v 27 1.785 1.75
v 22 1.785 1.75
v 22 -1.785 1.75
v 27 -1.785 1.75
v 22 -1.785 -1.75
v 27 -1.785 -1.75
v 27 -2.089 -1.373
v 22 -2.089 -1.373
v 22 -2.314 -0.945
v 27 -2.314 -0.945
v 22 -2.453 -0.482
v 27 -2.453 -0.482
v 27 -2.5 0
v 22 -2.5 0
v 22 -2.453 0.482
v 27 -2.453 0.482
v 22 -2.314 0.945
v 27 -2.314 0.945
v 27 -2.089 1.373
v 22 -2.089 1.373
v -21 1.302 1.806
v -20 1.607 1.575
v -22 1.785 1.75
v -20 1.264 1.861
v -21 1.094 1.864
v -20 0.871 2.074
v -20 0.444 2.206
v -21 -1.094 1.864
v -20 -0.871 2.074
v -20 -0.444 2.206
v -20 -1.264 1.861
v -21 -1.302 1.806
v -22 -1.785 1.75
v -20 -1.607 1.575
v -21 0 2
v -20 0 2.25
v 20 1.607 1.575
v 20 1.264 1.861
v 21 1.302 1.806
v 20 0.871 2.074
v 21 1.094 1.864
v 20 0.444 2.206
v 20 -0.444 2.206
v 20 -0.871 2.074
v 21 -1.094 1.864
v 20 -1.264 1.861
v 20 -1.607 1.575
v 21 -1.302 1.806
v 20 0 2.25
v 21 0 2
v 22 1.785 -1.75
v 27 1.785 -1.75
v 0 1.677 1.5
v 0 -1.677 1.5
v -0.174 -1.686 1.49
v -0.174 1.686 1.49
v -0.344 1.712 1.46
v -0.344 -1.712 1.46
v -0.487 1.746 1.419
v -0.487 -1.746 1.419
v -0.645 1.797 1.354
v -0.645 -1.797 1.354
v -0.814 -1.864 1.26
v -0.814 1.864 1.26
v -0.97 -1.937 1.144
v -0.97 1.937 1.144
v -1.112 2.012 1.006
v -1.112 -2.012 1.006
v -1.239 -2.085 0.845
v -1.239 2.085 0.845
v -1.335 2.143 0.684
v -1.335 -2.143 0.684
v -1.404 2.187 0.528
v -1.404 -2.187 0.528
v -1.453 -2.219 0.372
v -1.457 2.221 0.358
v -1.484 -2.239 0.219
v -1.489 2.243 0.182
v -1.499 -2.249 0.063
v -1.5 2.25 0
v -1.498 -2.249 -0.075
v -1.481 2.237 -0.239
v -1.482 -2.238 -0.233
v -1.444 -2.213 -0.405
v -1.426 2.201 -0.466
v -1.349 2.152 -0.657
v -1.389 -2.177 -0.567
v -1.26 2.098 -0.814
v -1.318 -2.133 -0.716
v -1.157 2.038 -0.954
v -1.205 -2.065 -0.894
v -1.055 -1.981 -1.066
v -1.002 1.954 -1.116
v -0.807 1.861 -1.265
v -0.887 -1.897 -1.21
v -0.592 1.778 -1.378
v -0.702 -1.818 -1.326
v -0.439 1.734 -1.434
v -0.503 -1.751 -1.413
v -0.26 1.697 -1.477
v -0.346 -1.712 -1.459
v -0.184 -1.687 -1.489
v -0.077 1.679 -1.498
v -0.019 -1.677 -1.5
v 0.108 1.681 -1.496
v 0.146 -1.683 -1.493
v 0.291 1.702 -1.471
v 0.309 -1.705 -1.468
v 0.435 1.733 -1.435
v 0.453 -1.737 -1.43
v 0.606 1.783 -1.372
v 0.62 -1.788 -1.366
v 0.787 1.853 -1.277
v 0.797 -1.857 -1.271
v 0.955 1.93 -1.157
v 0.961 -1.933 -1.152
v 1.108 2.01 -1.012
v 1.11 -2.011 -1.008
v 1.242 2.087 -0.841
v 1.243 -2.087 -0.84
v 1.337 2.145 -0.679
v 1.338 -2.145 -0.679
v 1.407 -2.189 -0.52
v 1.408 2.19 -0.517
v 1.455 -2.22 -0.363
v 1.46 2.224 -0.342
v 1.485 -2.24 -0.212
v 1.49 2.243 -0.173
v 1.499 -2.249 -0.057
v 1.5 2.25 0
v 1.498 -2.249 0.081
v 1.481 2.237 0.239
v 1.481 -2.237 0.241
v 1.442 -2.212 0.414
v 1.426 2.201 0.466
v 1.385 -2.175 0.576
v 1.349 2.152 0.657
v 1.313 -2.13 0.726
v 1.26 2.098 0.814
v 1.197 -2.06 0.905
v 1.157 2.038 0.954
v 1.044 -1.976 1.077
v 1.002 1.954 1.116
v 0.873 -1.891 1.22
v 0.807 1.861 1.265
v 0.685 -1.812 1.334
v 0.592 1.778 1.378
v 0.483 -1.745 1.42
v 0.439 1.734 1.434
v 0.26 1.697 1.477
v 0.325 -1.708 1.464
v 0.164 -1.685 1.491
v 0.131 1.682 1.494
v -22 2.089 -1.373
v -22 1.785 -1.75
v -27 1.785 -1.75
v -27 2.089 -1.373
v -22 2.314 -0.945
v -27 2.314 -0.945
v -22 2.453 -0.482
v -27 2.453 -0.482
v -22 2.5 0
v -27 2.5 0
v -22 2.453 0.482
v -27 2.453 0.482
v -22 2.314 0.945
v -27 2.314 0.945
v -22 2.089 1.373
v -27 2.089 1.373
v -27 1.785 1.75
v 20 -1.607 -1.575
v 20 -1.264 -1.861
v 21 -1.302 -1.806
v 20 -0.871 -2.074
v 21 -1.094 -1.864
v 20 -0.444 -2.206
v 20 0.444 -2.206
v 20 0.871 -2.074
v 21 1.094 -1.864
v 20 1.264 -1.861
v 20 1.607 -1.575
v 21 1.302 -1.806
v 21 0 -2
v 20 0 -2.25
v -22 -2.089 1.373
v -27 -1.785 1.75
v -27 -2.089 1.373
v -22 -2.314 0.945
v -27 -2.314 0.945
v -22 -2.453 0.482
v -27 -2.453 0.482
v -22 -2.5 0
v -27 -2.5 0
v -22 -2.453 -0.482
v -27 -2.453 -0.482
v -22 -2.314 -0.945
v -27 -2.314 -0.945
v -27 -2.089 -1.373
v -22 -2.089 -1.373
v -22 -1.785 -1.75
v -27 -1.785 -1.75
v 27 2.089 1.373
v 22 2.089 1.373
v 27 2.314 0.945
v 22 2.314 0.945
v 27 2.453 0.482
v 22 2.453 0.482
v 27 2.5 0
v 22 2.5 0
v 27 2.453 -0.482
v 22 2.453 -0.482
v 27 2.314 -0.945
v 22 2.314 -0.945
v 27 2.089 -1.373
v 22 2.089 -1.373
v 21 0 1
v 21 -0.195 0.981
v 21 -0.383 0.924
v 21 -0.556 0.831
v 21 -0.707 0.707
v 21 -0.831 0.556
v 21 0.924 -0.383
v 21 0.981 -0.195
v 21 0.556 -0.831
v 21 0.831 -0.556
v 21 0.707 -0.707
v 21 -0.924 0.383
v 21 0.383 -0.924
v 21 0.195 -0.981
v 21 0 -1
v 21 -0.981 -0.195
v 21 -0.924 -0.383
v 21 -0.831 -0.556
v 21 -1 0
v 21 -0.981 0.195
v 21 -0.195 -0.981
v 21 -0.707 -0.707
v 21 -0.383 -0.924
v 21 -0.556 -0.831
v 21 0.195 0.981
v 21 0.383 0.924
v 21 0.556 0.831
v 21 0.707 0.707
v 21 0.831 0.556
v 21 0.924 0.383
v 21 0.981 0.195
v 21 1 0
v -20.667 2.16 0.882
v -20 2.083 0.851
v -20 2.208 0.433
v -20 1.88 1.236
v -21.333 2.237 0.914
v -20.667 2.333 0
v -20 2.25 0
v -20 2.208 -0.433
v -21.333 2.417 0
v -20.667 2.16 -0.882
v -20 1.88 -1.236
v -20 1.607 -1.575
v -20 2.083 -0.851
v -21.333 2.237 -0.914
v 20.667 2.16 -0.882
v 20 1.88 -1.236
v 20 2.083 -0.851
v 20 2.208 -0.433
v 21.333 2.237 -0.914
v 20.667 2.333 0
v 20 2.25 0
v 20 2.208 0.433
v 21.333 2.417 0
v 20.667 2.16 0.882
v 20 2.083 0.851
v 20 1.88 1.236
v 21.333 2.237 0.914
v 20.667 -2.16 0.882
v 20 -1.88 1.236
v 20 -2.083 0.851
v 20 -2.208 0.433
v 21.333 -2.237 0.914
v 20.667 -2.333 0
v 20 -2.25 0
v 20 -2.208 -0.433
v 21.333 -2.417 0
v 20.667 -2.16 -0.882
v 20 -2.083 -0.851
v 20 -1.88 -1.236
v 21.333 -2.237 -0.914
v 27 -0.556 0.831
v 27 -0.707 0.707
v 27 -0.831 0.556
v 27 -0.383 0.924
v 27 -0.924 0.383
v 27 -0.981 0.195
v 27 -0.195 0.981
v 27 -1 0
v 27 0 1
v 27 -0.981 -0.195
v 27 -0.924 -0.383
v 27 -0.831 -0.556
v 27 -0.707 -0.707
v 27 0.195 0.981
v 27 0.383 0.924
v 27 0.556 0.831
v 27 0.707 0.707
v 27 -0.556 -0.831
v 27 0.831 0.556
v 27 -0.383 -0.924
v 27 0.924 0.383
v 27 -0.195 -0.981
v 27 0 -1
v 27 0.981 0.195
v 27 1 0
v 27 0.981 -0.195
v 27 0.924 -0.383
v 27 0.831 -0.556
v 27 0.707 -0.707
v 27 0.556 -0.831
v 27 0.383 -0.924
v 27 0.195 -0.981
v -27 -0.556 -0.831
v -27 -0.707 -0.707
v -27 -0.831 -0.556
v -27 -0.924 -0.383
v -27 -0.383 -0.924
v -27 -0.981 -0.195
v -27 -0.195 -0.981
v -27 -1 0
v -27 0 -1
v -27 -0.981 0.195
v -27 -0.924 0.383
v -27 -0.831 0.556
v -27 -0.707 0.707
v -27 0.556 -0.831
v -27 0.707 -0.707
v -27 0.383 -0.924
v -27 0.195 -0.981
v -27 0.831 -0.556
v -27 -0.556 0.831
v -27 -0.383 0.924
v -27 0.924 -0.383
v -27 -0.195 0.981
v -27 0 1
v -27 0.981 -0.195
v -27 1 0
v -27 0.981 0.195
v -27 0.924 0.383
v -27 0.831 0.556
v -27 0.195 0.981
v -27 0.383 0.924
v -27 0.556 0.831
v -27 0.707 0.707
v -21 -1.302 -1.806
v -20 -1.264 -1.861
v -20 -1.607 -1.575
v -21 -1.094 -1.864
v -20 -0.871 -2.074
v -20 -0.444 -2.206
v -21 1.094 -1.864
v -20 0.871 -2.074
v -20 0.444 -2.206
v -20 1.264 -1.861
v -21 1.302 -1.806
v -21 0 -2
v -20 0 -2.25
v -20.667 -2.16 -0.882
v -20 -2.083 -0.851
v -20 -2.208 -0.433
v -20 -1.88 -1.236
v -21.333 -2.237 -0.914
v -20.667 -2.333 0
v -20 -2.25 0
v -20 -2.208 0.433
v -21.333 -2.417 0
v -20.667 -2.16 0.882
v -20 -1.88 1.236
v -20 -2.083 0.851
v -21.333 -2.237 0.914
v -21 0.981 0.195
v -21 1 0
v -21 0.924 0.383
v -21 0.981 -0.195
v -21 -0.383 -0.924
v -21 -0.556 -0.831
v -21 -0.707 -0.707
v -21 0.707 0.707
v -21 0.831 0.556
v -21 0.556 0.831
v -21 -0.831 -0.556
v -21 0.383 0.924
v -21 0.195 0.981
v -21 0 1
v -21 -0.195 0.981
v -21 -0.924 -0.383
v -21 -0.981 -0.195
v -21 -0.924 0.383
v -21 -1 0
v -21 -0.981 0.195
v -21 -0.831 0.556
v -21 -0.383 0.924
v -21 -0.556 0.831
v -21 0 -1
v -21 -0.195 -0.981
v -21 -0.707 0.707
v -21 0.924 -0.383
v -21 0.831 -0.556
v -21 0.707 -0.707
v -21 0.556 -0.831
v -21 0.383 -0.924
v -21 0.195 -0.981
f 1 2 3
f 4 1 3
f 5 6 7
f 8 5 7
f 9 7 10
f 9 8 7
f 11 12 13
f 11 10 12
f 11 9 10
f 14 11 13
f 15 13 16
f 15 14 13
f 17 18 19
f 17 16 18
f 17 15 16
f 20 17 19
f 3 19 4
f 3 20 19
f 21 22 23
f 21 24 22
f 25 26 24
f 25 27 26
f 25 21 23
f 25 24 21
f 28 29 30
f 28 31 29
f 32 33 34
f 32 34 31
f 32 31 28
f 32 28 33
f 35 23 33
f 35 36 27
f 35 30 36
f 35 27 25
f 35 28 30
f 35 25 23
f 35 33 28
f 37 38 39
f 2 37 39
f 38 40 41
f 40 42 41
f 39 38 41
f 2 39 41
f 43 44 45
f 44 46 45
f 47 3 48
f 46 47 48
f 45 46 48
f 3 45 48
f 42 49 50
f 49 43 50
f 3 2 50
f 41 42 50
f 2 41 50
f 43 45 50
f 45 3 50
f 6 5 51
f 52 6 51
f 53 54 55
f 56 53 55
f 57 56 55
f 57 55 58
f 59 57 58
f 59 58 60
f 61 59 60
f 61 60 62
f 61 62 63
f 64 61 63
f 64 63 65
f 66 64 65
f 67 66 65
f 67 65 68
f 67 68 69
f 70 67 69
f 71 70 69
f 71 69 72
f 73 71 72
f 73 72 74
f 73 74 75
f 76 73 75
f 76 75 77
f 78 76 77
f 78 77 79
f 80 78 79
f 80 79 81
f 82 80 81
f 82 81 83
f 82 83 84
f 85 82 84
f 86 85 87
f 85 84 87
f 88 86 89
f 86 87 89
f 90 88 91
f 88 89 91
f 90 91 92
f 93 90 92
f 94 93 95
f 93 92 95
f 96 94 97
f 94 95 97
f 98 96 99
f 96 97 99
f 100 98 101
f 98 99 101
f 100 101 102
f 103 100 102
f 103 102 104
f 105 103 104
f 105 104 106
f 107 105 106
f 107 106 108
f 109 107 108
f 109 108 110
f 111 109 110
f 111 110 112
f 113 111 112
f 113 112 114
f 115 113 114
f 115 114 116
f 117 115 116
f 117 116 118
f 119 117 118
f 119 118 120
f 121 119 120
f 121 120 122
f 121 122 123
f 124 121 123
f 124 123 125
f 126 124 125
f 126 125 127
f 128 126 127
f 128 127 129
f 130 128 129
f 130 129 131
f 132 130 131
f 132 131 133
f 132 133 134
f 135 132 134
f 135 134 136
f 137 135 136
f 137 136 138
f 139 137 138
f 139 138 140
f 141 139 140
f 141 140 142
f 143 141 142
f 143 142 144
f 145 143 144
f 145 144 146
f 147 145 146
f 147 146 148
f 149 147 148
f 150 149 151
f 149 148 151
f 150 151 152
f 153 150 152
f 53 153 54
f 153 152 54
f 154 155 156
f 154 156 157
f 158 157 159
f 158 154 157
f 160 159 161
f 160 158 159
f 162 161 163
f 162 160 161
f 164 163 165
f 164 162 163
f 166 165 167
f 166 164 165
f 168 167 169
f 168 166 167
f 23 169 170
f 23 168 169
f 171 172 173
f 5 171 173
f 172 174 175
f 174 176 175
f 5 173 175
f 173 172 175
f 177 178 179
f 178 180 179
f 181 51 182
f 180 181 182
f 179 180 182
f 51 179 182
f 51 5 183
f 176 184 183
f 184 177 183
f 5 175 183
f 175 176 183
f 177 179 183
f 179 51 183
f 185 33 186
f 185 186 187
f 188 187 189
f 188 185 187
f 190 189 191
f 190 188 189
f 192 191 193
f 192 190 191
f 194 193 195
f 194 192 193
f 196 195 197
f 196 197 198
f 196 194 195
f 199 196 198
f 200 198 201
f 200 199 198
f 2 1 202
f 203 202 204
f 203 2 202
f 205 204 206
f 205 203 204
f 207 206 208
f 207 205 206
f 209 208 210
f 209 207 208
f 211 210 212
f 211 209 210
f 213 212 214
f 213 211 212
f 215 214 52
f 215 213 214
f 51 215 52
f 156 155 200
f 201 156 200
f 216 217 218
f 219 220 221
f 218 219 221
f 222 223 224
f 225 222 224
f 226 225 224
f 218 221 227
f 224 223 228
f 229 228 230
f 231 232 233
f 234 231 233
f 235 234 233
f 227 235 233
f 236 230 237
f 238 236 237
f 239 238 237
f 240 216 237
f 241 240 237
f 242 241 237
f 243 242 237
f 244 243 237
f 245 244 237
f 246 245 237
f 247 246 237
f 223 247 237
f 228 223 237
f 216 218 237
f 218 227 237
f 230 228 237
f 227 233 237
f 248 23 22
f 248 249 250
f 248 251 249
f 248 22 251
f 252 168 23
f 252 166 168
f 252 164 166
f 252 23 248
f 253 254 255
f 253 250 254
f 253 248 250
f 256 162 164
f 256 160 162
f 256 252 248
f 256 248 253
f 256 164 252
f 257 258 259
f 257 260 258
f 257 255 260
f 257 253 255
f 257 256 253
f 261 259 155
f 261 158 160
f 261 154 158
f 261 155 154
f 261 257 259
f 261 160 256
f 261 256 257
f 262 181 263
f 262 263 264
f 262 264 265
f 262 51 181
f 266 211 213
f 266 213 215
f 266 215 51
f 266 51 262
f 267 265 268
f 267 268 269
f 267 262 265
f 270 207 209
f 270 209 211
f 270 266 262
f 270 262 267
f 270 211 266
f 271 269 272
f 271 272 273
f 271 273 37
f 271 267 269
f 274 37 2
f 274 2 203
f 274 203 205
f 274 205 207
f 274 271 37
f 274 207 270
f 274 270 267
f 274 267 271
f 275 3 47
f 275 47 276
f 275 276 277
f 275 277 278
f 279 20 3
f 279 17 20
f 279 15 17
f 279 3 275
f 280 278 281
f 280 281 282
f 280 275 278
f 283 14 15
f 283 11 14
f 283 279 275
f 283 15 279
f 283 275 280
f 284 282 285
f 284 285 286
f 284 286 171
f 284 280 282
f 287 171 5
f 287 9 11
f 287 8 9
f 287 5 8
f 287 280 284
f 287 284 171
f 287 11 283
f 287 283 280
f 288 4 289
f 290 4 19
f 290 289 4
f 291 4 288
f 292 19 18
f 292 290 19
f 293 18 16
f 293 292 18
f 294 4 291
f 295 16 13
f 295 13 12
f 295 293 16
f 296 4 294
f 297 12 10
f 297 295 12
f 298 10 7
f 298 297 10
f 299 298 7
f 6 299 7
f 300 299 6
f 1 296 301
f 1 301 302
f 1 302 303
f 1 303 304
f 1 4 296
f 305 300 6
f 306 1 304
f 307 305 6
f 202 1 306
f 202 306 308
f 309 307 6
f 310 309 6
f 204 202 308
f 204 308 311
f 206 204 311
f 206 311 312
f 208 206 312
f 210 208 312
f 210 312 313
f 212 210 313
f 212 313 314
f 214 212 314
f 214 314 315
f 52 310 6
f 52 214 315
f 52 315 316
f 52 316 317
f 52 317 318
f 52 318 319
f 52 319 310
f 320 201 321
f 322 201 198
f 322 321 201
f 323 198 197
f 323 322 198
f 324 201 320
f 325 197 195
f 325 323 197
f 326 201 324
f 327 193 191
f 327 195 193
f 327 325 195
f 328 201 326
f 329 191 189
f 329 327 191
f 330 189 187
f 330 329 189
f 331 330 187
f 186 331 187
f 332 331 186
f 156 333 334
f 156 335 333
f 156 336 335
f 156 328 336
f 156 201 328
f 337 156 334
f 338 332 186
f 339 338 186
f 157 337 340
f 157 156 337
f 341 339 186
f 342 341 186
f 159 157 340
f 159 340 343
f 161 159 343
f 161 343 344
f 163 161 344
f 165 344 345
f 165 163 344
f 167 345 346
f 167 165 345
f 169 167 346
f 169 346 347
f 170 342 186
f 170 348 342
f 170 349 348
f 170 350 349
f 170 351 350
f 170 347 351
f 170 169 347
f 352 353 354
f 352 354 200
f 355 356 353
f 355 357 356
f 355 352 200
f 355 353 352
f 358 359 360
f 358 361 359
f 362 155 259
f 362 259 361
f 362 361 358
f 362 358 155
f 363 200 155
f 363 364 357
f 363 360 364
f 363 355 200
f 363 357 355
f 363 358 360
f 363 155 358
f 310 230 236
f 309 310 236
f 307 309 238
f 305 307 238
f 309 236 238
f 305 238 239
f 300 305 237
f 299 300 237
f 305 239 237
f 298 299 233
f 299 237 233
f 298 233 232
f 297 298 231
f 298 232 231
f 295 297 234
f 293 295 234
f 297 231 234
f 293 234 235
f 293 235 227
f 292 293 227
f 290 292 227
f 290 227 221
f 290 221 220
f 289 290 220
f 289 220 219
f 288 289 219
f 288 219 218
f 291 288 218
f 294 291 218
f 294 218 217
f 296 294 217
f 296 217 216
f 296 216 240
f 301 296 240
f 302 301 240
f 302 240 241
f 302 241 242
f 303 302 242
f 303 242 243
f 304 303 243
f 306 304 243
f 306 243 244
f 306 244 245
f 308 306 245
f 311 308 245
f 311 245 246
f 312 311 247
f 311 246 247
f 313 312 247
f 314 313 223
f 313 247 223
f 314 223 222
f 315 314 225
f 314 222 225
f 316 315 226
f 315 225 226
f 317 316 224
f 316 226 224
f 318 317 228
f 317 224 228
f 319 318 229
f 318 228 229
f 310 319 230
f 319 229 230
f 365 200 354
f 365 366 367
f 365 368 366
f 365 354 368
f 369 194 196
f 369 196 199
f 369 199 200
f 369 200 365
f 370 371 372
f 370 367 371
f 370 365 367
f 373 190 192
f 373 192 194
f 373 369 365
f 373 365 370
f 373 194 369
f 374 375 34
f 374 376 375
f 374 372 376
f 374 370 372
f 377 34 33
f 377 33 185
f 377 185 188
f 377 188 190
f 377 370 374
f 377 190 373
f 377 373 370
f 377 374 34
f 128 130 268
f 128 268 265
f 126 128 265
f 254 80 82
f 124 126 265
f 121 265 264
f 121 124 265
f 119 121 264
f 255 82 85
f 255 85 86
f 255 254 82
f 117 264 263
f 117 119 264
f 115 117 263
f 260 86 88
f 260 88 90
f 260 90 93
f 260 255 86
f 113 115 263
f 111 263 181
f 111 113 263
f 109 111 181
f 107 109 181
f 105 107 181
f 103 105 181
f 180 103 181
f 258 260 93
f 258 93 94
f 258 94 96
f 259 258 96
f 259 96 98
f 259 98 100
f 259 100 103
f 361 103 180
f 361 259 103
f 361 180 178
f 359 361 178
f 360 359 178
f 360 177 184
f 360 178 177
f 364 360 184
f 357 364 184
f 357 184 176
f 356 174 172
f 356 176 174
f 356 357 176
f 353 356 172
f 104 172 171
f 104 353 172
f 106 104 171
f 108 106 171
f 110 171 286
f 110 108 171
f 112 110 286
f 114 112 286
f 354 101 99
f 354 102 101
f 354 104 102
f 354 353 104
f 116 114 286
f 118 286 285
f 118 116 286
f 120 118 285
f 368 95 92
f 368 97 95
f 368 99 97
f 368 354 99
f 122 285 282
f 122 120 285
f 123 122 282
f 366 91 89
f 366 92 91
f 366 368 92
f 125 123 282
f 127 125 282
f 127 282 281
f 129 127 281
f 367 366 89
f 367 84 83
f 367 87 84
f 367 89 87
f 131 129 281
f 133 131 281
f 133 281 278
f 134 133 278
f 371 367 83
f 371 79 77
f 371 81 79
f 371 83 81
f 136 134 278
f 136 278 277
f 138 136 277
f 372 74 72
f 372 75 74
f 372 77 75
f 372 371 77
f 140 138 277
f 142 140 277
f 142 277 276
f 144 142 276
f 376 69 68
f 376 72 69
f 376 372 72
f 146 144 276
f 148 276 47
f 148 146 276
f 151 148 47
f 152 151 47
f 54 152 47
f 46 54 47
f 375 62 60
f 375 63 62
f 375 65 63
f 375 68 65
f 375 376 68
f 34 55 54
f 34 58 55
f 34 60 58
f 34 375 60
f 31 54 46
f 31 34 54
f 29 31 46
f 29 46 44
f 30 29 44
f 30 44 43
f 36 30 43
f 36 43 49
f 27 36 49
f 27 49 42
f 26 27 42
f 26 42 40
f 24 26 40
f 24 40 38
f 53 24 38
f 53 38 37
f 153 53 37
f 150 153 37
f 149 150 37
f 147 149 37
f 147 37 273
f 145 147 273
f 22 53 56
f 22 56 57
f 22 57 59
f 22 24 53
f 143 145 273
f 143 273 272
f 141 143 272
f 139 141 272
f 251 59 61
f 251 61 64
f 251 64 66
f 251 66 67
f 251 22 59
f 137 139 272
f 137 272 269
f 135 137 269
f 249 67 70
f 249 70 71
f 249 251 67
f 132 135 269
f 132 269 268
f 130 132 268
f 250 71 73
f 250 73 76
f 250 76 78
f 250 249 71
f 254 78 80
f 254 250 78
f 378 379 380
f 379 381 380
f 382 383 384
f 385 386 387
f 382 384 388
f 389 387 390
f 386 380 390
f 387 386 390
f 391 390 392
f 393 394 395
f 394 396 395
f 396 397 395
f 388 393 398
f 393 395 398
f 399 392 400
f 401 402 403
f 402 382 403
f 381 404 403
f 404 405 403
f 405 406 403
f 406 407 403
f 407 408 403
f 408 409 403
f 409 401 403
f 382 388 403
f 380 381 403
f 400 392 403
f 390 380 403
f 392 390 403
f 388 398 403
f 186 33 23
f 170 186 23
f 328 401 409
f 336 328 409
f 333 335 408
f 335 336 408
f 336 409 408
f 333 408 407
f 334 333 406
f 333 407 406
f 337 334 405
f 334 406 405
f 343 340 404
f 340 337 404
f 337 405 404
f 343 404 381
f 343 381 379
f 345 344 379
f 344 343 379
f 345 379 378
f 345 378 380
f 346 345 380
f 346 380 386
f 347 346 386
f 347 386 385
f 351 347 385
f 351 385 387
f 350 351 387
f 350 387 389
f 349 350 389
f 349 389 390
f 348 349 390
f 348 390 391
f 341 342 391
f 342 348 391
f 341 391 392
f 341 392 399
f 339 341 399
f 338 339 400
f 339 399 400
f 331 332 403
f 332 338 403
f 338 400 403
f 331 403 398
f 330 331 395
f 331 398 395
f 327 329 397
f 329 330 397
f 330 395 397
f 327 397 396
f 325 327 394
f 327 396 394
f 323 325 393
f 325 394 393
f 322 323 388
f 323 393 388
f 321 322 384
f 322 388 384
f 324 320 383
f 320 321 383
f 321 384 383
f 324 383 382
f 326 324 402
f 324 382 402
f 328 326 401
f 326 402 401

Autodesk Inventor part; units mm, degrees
ref_plane "YZ Plane" through (0, 0, 0) normal (1, 0, 0) x (0, 1, 0)
sketch "Sketch1" plane through (0, 0, 0) normal (1, 0, 0) x (0, 1, 0)
  circle A0 centre (0, 0) radius 2.25
  dimension "diameter" = 4.5
extrude "Extrusion1" add sketch "Sketch1" along normal blind 20
ref_plane "Work Plane1" through (22, 0, 0) normal (1, 0, 0) x (0, 0, -1)
sketch "Sketch3" plane through (22, 0, 0) normal (1, 0, 0) x (0, 0, -1)
  arc A0 (-1.75, 1.7854) -> (-1.75, -1.7854) centre (0, 0) ccw construction
  line L0 (-1.75, -1.7854) -> (1.75, -1.7854) construction
  line L1 (1.75, -1.7854) -> (1.75, 1.7854)
  line L2 (1.75, 1.7854) -> (-1.75, 1.7854) construction
  line L3 (-1.75, 1.7854) -> (-1.75, -1.7854)
  line L4 (-1.75, -1.7854) -> (1.75, 1.7854) construction
  line L5 (1.75, -1.7854) -> (0, 0) construction
  arc A1 (1.75, 1.7854) -> (-1.75, 1.7854) centre (0, 0) ccw
  arc A2 (1.75, -1.7854) -> (1.75, 1.7854) centre (0, 0) ccw construction
  arc A3 (-1.75, -1.7854) -> (1.75, -1.7854) centre (0, 0) ccw
  line L6 (0, 0) -> (-1.75, 1.7854) construction
  dimension "d23" = 5
  dimension "d34" = 3.5
extrude "Extrusion3" add sketch "Sketch3" along normal blind 5
loft "Loft1" add section 1 edges at (22, 2.5, 0) (22, 0, -1.75) (22, -2.5, 0) (22, 0, 1.75) section 2 edges at (20, -2.25, 0)
sketch "Sketch4" plane through (27, 0, 0) normal (1, 0, 0) x (0, 0, -1)
  arc A0 (1.75, 1.7854) -> (-1.75, 1.7854) centre (0, 0) ccw projected
hole "Hole1" at (27, 0, 0) direction (-1, 0, 0) diameter 2 depth 6
mirror "Mirror1" about plane through (0, 0, 0) normal (-1, 0, 0)
ref_plane "Work Plane2" through (0, 5, 0) normal (0, 1, 0) x (-1, 0, 0)
sketch "Sketch5" plane through (0, 5, 0) normal (0, 1, 0) x (-1, 0, 0)
  point P0 (0, 0)
  point P1 (0, 0)
hole "Hole2" at (0, 5, 0) direction (0, -1, 0) diameter 3 end through all counterbore diameter 6 counterbore depth 2
properties part number "front shaft v2"
